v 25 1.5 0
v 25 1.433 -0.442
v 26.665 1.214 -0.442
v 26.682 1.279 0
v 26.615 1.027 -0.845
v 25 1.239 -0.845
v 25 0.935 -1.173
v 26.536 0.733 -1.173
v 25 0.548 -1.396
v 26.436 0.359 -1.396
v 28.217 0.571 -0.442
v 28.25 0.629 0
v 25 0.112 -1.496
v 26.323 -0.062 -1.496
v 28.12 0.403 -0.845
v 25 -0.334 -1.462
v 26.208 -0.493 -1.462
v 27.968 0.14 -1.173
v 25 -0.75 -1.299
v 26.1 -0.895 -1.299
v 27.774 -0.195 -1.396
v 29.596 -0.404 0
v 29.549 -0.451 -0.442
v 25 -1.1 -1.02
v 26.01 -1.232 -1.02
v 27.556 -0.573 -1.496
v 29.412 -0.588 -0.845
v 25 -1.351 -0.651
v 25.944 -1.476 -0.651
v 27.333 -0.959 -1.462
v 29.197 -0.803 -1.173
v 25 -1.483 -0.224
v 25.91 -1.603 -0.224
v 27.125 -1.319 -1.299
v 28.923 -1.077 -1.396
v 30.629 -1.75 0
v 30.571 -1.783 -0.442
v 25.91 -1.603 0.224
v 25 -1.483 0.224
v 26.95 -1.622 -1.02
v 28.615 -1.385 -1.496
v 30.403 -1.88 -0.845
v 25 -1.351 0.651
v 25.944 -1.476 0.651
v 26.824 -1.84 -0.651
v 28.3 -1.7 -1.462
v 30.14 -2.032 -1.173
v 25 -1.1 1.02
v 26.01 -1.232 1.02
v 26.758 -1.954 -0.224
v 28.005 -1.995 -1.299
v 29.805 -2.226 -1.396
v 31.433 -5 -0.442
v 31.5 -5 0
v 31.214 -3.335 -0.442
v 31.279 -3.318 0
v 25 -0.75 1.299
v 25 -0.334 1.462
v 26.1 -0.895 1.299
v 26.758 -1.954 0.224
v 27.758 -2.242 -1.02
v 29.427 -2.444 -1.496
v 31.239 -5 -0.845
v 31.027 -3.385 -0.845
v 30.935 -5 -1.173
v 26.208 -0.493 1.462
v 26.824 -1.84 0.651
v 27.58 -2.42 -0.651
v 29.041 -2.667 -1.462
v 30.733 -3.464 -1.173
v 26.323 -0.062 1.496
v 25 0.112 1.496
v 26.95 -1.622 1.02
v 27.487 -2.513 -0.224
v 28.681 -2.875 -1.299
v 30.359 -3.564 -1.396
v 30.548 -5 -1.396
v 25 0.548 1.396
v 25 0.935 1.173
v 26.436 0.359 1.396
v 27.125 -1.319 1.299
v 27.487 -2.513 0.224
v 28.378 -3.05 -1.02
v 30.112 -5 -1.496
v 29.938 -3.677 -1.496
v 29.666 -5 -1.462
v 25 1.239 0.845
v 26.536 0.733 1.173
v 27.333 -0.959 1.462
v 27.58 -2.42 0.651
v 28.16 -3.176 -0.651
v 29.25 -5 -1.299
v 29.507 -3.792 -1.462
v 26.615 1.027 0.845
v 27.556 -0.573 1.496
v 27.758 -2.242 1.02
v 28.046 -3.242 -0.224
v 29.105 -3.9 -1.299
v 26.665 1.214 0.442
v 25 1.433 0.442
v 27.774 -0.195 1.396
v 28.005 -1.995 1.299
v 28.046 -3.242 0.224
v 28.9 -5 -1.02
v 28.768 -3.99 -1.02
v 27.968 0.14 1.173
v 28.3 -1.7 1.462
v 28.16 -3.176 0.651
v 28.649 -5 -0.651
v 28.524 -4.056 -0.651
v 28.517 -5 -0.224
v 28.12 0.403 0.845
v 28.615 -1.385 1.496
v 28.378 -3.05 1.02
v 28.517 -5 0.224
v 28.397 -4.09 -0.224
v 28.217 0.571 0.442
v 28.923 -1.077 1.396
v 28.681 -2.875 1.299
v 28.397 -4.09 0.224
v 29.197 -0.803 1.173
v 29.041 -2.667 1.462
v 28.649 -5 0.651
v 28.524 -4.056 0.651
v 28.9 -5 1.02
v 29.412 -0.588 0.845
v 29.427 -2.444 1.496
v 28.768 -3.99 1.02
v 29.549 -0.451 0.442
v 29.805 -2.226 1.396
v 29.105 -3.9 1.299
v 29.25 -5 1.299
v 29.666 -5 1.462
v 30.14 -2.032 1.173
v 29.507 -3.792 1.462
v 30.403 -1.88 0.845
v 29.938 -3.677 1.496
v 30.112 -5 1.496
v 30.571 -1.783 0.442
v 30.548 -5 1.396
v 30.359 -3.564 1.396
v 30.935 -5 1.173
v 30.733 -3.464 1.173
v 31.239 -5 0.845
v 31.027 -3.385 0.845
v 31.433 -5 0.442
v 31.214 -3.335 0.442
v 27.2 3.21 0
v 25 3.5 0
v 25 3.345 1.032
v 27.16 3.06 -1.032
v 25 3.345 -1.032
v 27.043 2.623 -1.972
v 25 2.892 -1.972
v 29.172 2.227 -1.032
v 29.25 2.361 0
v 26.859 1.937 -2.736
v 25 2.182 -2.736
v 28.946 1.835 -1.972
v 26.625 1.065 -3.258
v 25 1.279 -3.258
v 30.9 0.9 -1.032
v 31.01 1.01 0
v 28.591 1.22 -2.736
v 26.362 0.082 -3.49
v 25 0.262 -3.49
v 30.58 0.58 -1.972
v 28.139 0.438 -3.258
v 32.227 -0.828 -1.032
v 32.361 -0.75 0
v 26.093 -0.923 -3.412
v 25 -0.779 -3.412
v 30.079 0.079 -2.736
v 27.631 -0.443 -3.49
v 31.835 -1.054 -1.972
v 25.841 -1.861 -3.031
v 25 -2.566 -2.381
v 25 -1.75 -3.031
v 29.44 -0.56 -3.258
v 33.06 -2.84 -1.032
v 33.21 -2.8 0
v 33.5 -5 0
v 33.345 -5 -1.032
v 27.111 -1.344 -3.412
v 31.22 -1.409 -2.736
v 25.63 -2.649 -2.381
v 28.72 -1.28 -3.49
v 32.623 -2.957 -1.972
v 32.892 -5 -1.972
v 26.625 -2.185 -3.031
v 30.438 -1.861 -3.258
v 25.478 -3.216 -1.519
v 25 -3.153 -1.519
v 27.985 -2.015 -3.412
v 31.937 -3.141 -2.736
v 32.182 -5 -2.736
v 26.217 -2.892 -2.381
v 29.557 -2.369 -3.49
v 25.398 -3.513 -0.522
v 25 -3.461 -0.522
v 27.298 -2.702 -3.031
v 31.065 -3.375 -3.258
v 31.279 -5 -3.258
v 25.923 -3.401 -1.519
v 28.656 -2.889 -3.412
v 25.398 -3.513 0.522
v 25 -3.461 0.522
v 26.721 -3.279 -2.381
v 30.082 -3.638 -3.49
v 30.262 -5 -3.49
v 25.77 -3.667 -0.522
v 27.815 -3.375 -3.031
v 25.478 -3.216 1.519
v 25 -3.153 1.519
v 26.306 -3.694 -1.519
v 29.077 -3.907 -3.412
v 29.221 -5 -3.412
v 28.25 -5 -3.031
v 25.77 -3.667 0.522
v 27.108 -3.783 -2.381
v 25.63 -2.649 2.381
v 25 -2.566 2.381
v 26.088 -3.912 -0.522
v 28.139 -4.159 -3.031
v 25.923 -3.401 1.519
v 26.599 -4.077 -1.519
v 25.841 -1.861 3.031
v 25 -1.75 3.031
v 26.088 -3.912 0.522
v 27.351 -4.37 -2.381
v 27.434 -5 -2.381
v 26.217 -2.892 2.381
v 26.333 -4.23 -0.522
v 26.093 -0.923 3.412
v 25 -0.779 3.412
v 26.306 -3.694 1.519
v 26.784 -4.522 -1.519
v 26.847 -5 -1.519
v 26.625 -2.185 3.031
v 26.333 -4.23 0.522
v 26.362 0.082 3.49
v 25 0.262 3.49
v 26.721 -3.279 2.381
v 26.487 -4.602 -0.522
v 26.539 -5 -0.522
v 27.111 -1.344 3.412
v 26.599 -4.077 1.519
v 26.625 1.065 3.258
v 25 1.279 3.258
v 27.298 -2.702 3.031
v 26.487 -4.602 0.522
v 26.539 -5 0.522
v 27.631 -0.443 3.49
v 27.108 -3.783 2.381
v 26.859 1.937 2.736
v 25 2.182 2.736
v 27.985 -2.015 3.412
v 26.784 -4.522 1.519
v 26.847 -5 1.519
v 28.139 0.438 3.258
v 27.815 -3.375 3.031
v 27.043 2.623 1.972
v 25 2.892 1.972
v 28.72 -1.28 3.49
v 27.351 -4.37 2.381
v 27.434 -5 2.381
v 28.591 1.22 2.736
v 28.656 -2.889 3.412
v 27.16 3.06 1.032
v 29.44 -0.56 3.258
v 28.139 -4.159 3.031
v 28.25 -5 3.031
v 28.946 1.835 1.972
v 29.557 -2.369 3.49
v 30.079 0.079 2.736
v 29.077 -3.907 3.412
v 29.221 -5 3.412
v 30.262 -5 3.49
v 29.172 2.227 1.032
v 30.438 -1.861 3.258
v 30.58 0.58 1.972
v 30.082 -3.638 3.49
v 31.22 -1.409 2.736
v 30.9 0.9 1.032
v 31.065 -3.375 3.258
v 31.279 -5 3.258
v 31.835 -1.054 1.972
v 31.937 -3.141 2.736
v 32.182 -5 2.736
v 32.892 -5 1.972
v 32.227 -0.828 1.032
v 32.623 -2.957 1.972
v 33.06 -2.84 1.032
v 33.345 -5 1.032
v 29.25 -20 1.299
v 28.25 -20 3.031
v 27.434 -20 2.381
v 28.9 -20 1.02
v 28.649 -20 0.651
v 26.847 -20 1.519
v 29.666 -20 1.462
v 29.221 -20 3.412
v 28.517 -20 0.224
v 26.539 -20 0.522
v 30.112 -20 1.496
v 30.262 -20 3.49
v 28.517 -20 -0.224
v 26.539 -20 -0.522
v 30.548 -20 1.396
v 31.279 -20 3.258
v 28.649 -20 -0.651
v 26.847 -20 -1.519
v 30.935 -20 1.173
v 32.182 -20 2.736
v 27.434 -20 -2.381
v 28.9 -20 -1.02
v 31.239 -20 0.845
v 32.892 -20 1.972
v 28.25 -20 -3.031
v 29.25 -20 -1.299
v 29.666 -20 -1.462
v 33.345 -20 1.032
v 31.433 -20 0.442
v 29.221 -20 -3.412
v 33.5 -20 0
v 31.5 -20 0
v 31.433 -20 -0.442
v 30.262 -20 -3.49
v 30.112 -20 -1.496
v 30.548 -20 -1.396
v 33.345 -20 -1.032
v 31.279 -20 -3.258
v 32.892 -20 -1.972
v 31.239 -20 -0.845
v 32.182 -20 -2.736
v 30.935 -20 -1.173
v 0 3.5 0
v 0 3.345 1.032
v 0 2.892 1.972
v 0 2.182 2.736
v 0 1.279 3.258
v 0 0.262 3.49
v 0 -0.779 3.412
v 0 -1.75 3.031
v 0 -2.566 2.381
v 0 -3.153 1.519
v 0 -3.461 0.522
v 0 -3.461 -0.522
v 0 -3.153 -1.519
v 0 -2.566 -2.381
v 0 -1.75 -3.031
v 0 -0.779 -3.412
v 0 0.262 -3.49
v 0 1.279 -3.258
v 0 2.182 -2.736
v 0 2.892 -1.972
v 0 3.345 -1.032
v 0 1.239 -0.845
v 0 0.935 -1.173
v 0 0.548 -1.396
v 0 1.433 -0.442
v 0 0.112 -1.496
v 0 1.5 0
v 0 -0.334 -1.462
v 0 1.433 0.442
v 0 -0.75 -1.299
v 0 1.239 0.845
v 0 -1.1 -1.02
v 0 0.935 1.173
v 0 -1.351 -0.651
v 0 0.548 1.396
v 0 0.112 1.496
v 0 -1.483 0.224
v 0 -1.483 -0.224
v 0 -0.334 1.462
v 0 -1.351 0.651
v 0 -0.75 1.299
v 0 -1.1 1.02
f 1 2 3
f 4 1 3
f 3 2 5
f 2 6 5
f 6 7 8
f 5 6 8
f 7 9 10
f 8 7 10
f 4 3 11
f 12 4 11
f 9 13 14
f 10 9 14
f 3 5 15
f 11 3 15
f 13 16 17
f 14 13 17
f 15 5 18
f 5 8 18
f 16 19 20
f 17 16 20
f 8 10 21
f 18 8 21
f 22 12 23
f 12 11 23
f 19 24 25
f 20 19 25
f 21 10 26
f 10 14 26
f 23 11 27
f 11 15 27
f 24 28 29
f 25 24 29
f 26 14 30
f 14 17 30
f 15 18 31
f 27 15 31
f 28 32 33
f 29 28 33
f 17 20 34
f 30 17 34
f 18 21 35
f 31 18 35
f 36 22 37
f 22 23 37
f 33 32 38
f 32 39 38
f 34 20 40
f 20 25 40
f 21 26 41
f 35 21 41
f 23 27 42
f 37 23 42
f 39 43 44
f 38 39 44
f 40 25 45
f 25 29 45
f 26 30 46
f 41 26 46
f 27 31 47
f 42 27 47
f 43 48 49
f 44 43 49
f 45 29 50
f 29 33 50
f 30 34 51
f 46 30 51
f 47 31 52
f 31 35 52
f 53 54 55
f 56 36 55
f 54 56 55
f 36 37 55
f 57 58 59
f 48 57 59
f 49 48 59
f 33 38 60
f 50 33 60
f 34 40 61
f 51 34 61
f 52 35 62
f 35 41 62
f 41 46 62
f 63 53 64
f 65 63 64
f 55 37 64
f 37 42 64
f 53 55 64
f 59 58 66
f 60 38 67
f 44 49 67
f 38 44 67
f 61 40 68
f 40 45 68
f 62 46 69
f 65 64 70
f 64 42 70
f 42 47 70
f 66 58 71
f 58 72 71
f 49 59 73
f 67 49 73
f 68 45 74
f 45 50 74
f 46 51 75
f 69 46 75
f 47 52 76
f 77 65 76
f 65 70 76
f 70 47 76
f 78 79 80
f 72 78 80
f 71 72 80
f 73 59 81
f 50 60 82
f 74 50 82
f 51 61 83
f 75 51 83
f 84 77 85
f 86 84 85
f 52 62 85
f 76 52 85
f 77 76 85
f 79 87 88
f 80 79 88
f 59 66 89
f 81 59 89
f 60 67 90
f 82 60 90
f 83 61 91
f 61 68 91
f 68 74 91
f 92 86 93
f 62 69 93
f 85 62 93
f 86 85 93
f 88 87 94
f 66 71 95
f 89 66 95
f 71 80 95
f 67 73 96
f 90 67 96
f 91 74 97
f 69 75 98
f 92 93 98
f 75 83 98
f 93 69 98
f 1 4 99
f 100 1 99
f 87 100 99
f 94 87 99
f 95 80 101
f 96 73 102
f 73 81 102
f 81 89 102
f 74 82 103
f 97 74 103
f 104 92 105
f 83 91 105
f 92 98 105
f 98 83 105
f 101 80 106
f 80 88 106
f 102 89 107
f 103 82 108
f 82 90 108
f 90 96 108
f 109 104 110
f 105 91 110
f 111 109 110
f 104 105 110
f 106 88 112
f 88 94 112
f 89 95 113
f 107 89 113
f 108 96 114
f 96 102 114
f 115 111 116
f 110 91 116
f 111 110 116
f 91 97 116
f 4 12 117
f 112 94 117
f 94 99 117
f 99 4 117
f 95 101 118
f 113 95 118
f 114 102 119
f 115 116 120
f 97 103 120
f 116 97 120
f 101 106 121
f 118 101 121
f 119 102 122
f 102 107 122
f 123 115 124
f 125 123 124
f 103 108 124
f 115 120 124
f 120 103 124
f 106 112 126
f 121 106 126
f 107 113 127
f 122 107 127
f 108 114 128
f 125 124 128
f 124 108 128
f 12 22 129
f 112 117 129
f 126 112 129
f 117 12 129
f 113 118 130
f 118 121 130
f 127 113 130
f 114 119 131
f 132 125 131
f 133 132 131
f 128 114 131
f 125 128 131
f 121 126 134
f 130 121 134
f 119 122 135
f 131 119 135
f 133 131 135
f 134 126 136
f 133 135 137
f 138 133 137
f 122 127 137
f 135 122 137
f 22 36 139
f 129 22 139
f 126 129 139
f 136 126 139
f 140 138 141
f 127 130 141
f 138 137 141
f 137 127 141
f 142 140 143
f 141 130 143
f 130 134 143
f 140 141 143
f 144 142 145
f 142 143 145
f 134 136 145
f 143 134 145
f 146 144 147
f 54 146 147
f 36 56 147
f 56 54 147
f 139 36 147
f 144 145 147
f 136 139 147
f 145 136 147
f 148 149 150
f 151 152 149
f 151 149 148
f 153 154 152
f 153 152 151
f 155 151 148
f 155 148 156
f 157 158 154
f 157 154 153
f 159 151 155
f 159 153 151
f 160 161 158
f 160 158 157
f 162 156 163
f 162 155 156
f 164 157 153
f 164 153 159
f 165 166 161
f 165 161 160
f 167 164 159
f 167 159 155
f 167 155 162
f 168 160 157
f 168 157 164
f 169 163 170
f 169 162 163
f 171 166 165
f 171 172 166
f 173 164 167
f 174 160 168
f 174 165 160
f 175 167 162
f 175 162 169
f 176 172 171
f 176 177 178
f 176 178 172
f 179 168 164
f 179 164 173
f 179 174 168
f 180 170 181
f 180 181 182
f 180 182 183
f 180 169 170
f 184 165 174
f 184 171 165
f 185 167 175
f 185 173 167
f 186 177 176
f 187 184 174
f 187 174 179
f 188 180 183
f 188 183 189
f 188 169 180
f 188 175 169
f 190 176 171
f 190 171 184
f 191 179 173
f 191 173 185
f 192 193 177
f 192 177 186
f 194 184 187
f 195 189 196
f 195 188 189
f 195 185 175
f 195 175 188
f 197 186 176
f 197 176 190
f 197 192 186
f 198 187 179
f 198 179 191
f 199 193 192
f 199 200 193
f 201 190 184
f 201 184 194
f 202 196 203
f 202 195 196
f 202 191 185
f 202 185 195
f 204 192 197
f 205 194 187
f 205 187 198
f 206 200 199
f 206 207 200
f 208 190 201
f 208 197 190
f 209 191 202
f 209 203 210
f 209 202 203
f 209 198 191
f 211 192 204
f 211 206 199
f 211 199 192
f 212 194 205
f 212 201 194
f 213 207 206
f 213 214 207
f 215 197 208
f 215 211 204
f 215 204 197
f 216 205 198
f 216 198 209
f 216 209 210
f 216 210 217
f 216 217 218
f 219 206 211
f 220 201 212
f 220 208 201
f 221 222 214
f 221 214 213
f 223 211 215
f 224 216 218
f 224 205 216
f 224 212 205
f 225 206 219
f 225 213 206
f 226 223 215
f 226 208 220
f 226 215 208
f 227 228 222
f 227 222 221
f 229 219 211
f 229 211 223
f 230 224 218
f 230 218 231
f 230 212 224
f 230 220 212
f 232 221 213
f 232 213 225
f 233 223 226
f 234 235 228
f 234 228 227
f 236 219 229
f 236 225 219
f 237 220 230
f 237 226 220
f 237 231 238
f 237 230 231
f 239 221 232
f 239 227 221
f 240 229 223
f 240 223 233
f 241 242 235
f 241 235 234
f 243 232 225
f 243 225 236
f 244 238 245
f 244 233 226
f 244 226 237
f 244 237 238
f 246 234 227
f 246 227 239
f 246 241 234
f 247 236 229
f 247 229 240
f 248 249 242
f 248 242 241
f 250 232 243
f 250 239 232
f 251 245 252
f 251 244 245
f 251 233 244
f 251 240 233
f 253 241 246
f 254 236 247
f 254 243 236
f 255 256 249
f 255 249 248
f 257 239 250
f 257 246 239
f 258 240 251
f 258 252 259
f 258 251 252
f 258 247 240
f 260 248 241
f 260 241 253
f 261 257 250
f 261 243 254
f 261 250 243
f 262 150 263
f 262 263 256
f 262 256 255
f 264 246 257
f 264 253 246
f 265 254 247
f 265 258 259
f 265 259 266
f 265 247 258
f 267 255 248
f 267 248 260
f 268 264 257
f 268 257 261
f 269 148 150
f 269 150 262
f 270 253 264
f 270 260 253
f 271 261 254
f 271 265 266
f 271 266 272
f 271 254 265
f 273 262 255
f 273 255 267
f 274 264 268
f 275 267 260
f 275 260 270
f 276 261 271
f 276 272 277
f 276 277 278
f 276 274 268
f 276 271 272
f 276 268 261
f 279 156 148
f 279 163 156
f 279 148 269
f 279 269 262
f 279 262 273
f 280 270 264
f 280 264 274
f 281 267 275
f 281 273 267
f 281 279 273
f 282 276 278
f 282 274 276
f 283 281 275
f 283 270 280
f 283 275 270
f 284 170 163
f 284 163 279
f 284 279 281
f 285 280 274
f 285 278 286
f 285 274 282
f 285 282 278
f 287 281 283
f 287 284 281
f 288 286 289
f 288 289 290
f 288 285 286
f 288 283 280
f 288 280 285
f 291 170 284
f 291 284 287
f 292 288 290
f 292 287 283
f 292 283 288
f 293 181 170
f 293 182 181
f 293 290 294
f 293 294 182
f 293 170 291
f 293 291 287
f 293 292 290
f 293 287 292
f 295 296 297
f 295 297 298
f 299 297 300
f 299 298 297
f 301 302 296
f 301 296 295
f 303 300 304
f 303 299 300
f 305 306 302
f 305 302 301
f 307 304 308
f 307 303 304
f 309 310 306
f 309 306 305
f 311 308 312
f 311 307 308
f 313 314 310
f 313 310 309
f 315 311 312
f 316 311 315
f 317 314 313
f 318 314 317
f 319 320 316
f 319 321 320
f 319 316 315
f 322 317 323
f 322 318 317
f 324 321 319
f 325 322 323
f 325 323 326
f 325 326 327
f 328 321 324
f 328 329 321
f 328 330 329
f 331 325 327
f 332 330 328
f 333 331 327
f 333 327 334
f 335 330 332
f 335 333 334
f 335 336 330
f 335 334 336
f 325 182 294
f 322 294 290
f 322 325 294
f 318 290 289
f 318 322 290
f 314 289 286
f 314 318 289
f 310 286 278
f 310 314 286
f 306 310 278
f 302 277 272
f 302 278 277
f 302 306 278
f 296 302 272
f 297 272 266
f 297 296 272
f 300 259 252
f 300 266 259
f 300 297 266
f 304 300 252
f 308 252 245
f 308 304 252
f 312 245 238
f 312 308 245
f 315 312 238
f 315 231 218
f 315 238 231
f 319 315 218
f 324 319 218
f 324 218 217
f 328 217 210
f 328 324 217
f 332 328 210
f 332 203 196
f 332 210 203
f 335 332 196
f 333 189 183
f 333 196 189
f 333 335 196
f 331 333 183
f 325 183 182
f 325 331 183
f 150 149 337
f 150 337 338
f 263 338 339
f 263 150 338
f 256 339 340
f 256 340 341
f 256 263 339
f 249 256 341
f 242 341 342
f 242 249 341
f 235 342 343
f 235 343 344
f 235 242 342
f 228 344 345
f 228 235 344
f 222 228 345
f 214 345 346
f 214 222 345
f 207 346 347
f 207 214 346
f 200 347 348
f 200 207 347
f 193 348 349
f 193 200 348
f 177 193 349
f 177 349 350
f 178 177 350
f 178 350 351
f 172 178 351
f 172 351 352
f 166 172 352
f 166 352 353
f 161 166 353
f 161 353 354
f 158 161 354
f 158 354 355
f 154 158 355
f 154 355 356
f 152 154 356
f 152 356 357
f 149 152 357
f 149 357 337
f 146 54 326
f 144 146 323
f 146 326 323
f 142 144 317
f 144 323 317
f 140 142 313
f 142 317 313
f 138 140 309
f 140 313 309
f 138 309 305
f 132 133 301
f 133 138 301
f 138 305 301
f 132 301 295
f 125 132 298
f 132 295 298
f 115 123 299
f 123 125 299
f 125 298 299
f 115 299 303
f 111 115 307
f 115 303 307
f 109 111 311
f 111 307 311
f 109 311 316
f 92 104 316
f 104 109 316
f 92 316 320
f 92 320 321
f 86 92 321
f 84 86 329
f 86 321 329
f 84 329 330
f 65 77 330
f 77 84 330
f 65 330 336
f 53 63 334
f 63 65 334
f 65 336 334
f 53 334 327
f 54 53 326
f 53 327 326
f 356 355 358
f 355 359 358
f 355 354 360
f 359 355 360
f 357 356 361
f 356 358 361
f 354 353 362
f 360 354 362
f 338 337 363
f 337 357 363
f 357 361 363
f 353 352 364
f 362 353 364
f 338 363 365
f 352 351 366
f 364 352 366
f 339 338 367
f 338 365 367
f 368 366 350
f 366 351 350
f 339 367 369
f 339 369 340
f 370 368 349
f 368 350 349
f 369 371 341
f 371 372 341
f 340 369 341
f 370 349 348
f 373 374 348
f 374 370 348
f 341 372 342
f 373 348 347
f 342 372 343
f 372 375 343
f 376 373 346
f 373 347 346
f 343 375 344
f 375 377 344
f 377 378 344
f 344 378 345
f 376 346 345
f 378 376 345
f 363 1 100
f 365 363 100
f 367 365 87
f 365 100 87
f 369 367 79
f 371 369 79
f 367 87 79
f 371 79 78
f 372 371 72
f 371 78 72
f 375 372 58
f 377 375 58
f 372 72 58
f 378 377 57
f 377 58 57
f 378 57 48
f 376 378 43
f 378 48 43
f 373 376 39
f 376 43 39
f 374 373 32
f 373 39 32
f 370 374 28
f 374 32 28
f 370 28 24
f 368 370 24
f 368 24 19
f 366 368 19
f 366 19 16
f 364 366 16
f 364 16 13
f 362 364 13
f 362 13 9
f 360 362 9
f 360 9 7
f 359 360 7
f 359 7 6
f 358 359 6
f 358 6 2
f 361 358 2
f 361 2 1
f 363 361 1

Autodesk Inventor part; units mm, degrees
ref_plane "YZ Plane" through (0, 0, 0) normal (1, 0, 0) x (0, 1, 0)
ref_plane "XZ Plane" through (0, 0, 0) normal (0, 1, 0) x (-1, 0, 0)
ref_plane "XY Plane" through (0, 0, 0) normal (0, 0, 1) x (1, 0, 0)
sketch "Sketch2" plane through (0, 0, 0) normal (1, 0, 0) x (0, 1, 0)
  circle A0 centre (0, 0) radius 1.5
  circle A1 centre (0, 0) radius 3.5
  dimension "d8" = 3
  dimension "d9" = 2
sketch3d "3D Sketch1"
  line L0 (0, 0, 0) -> (25, 0, 0)
  arc A0 (25, 0, 0) -> (30, -5, 0) centre (25, -5, 0) ccw
  line L1 (30, -5, 0) -> (30, -20, 0)
  dimension "d3" = 30
  dimension "d4" = 20
  dimension "d6" = 5
sweep "Sweep1" add profiles "Sketch2" path "3D Sketch1"
properties part number "Pipe3"
